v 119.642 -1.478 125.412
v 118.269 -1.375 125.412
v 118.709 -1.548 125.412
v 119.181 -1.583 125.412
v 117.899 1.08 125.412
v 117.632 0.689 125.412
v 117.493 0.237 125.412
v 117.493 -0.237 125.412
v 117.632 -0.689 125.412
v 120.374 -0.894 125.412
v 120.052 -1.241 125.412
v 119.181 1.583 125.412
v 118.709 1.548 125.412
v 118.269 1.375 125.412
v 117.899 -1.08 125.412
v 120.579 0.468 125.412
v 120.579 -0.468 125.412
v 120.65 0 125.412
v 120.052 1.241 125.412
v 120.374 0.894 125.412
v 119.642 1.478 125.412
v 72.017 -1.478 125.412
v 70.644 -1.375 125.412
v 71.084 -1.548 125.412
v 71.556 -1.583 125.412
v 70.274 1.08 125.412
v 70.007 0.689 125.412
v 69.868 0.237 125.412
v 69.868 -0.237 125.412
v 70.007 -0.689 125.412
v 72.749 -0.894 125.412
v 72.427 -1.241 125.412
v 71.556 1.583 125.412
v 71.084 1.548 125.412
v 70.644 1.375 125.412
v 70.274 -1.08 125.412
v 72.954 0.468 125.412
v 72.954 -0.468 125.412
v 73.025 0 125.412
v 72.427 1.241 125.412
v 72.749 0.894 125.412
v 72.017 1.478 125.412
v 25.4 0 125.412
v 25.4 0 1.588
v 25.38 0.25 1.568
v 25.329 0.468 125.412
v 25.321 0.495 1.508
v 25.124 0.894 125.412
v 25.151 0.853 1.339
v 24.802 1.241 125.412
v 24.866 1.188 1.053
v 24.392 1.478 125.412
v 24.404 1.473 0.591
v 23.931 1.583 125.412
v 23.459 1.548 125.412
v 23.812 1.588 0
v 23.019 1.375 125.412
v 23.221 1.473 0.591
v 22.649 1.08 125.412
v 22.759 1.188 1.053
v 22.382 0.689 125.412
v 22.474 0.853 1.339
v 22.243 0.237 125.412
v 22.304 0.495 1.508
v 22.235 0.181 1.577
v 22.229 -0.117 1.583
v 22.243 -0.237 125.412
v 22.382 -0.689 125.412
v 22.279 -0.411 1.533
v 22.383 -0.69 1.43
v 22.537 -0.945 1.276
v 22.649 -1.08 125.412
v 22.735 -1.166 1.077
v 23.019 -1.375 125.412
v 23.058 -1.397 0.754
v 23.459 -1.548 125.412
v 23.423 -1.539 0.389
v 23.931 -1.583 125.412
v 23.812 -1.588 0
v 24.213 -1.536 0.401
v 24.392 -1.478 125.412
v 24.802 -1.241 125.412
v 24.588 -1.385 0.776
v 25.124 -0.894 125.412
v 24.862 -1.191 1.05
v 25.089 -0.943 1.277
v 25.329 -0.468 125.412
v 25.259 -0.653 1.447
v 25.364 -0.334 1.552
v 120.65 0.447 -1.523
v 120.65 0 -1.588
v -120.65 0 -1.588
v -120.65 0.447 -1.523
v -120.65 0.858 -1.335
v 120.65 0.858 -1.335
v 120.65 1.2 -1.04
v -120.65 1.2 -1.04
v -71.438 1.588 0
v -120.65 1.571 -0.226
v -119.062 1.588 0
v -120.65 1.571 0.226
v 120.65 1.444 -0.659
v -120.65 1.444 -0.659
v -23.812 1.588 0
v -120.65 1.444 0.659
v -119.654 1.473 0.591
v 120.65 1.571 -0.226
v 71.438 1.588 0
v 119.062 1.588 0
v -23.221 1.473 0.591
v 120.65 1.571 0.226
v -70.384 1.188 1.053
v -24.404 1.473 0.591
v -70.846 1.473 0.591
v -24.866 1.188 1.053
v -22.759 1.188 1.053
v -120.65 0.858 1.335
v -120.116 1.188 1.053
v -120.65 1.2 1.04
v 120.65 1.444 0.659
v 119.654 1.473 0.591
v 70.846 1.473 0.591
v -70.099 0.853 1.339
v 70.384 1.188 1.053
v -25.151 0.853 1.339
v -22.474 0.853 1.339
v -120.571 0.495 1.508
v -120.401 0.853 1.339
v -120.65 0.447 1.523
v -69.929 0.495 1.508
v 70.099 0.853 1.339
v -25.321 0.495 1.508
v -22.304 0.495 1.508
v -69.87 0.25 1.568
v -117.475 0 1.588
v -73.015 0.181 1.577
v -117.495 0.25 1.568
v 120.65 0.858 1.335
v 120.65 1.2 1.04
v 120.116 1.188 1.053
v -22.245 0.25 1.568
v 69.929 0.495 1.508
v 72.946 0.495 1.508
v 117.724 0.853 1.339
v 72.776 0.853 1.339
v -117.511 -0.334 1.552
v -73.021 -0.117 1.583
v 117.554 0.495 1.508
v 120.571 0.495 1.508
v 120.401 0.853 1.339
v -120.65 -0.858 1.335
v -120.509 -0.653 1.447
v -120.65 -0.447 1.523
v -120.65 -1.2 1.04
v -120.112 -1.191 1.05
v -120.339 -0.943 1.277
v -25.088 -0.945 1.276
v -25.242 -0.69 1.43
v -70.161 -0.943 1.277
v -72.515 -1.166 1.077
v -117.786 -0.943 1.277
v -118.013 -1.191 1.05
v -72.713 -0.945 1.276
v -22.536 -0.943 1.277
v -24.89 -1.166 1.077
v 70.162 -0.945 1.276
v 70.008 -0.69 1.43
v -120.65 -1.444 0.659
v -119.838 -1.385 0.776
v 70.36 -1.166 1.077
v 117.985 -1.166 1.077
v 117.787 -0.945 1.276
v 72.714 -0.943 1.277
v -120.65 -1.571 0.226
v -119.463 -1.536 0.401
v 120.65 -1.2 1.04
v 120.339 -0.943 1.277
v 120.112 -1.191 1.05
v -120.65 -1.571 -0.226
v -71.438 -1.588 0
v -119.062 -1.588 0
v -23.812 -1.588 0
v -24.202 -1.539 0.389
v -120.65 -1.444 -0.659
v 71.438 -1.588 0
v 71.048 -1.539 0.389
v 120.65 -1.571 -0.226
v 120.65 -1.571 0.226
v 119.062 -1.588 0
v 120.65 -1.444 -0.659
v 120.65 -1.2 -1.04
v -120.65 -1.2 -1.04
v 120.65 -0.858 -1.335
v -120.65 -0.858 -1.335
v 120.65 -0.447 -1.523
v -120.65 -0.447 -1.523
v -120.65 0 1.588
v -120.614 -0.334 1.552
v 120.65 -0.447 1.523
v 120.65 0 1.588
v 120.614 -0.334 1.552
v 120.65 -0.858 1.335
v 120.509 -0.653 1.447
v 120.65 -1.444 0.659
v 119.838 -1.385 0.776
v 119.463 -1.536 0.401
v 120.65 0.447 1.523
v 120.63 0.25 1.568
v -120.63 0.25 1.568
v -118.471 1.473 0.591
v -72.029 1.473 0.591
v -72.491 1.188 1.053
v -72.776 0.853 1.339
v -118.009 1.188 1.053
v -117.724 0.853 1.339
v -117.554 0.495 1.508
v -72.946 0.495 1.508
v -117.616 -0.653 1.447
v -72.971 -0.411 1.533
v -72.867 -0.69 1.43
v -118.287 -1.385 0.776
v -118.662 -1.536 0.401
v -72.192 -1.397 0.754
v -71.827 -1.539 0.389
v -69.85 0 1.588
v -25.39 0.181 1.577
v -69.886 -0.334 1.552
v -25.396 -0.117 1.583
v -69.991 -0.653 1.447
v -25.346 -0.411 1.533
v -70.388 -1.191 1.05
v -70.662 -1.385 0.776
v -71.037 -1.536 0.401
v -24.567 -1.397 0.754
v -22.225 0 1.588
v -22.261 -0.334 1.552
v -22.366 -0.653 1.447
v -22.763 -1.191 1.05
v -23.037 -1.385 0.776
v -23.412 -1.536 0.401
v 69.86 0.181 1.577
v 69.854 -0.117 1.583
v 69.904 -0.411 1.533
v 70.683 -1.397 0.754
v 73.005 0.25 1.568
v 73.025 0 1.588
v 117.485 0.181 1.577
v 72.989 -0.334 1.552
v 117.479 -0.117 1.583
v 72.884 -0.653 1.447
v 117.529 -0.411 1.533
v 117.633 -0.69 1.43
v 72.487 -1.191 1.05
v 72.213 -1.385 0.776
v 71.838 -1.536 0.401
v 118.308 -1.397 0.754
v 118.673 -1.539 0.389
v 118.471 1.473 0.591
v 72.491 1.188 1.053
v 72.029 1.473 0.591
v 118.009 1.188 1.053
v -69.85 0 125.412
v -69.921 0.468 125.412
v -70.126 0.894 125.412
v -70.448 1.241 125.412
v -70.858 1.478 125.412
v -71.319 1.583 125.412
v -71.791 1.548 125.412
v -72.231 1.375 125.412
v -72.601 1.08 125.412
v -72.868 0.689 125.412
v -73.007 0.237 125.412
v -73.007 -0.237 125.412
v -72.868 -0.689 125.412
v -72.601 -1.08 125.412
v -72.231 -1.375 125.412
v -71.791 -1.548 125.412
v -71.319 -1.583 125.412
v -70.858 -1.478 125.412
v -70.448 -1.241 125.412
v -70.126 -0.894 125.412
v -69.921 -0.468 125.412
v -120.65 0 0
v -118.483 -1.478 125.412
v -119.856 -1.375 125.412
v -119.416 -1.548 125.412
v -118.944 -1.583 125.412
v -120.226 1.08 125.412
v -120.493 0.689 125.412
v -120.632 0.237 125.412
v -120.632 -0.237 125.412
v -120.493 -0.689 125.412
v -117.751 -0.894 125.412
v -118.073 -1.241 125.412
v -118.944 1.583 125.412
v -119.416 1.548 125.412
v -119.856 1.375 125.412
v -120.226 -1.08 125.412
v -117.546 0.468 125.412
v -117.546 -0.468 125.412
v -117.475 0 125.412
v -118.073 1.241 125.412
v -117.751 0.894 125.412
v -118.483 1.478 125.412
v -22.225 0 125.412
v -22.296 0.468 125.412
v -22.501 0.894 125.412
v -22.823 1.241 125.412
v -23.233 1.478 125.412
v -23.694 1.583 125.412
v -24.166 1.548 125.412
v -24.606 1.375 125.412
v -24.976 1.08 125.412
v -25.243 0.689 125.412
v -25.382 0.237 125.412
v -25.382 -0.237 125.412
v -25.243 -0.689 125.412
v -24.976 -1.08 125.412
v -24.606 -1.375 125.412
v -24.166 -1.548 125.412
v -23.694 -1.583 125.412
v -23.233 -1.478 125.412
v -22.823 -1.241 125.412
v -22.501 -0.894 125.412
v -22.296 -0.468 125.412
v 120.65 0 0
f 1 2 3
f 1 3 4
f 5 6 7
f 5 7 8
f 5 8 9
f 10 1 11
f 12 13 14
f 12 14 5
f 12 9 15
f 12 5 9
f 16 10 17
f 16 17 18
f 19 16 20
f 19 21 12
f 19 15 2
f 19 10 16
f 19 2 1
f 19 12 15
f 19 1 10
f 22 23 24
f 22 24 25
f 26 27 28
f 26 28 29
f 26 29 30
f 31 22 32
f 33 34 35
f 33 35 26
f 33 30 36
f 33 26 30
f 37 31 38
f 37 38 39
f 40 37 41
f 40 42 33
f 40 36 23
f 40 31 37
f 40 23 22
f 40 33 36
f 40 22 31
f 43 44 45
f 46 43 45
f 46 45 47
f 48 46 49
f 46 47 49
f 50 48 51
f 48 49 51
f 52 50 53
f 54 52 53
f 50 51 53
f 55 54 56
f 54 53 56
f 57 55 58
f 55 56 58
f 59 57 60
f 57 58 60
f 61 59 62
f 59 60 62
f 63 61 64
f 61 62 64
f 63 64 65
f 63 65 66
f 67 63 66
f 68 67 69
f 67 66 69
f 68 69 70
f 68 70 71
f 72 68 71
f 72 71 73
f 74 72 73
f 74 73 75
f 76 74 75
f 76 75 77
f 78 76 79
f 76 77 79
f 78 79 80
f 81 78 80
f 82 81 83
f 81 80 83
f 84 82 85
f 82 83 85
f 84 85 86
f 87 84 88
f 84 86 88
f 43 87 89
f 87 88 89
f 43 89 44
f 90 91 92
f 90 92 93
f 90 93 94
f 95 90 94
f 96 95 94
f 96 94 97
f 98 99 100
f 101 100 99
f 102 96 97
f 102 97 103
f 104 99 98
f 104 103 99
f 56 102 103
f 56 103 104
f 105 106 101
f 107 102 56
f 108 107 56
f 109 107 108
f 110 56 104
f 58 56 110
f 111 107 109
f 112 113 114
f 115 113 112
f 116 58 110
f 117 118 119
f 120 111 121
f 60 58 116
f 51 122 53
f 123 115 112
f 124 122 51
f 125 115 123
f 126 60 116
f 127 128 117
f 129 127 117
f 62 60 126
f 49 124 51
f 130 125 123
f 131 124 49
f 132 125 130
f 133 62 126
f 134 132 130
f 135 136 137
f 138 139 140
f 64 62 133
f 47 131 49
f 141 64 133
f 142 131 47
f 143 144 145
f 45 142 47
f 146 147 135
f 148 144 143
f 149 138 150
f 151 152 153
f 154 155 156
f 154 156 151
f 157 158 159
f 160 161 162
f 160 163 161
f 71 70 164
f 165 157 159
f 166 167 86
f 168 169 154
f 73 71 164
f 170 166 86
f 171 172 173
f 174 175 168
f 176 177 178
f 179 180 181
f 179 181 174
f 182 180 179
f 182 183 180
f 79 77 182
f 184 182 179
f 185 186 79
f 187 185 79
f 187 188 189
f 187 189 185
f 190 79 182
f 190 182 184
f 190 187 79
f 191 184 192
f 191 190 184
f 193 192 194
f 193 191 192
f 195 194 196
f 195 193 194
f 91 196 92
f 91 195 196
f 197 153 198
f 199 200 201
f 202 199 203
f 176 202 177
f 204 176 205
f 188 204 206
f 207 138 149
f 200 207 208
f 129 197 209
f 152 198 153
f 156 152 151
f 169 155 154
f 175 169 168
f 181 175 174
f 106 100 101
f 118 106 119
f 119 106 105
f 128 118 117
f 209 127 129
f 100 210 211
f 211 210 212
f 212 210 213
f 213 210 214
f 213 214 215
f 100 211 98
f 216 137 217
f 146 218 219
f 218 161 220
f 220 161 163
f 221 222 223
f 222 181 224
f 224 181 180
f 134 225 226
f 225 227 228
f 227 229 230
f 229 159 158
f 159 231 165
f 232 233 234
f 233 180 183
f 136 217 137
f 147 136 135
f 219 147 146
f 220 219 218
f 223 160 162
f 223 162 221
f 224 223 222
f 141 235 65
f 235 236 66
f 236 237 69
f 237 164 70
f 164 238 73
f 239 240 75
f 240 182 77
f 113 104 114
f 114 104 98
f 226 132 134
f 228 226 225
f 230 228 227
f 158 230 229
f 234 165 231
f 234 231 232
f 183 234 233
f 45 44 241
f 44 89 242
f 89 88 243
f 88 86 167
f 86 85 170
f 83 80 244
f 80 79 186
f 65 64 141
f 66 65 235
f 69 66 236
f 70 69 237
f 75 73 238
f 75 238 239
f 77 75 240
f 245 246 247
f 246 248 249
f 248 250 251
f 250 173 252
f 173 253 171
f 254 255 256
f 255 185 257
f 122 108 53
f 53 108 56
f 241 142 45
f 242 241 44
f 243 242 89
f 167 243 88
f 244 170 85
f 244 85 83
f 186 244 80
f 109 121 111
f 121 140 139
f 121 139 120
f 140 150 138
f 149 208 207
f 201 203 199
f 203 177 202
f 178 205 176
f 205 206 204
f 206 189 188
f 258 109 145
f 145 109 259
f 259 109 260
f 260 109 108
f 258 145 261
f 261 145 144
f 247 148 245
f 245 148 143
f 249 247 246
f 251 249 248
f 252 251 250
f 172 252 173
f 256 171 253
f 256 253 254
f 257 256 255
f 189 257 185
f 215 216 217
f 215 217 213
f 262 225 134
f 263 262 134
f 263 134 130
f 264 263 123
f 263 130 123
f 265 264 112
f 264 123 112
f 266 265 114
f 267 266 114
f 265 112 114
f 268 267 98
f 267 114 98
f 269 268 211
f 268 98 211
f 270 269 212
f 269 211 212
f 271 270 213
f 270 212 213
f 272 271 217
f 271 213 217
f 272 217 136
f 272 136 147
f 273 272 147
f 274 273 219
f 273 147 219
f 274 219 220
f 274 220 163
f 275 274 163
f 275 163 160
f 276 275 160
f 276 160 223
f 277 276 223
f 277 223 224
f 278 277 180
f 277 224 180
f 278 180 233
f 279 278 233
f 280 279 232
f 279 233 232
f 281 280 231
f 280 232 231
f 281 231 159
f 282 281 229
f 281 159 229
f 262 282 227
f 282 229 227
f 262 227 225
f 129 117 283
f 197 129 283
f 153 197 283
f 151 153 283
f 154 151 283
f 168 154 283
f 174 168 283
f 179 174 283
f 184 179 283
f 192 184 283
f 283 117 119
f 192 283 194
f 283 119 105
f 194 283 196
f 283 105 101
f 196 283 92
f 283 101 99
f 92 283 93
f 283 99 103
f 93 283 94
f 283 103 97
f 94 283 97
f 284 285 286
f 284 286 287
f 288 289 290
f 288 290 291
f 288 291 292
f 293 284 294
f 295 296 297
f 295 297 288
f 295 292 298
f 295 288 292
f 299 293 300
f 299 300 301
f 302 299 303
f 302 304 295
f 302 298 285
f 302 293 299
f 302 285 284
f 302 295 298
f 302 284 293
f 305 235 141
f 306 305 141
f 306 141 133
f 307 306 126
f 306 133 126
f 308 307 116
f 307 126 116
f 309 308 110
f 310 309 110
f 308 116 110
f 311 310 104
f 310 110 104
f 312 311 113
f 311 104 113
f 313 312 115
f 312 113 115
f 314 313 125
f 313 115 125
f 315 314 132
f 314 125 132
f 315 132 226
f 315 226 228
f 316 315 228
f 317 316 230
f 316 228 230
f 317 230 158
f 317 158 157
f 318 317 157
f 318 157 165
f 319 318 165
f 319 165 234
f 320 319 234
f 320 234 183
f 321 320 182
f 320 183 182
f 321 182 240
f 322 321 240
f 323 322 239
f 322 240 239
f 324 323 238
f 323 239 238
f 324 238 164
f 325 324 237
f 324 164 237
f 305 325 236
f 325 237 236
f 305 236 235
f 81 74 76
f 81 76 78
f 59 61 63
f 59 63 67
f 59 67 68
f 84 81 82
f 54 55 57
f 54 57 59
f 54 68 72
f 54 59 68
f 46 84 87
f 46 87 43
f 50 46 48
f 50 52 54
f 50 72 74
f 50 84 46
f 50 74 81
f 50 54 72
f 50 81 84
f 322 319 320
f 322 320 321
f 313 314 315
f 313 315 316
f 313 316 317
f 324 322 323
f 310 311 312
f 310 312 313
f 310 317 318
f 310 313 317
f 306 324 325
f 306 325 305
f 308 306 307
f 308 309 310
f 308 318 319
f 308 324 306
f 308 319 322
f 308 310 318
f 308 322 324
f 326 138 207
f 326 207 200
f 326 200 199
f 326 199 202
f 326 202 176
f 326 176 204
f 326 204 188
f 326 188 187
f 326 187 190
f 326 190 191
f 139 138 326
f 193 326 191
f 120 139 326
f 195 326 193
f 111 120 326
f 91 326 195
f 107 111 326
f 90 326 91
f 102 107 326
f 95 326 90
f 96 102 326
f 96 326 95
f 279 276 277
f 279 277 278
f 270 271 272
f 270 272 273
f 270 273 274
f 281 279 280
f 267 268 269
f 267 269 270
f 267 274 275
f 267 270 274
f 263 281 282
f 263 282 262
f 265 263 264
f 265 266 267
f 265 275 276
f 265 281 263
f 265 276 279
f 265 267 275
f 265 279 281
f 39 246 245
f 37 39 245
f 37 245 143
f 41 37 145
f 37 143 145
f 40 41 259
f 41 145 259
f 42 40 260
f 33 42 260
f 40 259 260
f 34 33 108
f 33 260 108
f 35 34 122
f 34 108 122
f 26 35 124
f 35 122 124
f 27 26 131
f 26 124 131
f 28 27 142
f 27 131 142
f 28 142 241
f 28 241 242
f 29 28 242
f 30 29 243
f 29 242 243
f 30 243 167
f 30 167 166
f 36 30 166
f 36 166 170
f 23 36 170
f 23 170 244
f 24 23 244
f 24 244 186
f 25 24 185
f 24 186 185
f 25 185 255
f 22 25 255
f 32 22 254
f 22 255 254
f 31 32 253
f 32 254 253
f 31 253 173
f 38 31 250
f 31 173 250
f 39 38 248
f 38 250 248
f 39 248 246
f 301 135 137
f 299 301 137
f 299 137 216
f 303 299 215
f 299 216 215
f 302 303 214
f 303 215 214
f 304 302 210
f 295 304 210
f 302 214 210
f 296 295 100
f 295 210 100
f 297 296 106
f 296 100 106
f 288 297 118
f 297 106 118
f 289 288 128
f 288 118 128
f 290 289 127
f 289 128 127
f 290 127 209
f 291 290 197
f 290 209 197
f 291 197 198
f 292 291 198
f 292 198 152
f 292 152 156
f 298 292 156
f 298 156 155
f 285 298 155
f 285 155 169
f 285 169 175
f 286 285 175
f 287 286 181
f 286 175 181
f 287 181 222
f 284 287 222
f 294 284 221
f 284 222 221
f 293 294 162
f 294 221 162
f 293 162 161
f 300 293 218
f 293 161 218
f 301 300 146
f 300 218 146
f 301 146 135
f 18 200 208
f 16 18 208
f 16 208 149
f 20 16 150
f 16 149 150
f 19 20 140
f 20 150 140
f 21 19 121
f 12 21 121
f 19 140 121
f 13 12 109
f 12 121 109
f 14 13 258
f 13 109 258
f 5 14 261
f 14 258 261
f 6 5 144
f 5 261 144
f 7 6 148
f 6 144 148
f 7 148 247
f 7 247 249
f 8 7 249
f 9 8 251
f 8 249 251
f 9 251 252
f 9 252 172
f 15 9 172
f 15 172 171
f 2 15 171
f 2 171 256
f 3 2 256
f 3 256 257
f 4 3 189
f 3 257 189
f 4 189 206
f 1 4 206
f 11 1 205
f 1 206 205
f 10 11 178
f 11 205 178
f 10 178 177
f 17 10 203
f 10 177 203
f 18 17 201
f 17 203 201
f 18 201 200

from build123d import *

# Parameters (mm, degrees)
SKETCH1_R           = 1.5875
BOSS_EXTRUDE1_DEPTH = 120.65
SKETCH3_R           = 1.5875
BOSS_EXTRUDE2_DEPTH = 125.4125
LPATTERN1_COUNT     = 6
LPATTERN1_PITCH     = 47.625


with BuildPart() as part:
    # Sketch1 → Boss-Extrude1 (new body, symmetric)
    with BuildSketch(Plane(origin=(0, 0, 0), x_dir=(0, 0, -1), z_dir=(1, 0, 0))):
        Circle(SKETCH1_R)
    extrude(amount=BOSS_EXTRUDE1_DEPTH, both=True)

    # Sketch3 → Boss-Extrude2 (add)
    with BuildSketch(Plane.XY):
        with Locations((-119.0625, 0)):
            Circle(SKETCH3_R)
    boss_extrude2 = extrude(amount=BOSS_EXTRUDE2_DEPTH)

    # LPattern1: Boss-Extrude2 ×6
    with Locations(*[(i * LPATTERN1_PITCH, 0, 0) for i in range(1, LPATTERN1_COUNT)]):
        add(boss_extrude2)


solid = part.part
